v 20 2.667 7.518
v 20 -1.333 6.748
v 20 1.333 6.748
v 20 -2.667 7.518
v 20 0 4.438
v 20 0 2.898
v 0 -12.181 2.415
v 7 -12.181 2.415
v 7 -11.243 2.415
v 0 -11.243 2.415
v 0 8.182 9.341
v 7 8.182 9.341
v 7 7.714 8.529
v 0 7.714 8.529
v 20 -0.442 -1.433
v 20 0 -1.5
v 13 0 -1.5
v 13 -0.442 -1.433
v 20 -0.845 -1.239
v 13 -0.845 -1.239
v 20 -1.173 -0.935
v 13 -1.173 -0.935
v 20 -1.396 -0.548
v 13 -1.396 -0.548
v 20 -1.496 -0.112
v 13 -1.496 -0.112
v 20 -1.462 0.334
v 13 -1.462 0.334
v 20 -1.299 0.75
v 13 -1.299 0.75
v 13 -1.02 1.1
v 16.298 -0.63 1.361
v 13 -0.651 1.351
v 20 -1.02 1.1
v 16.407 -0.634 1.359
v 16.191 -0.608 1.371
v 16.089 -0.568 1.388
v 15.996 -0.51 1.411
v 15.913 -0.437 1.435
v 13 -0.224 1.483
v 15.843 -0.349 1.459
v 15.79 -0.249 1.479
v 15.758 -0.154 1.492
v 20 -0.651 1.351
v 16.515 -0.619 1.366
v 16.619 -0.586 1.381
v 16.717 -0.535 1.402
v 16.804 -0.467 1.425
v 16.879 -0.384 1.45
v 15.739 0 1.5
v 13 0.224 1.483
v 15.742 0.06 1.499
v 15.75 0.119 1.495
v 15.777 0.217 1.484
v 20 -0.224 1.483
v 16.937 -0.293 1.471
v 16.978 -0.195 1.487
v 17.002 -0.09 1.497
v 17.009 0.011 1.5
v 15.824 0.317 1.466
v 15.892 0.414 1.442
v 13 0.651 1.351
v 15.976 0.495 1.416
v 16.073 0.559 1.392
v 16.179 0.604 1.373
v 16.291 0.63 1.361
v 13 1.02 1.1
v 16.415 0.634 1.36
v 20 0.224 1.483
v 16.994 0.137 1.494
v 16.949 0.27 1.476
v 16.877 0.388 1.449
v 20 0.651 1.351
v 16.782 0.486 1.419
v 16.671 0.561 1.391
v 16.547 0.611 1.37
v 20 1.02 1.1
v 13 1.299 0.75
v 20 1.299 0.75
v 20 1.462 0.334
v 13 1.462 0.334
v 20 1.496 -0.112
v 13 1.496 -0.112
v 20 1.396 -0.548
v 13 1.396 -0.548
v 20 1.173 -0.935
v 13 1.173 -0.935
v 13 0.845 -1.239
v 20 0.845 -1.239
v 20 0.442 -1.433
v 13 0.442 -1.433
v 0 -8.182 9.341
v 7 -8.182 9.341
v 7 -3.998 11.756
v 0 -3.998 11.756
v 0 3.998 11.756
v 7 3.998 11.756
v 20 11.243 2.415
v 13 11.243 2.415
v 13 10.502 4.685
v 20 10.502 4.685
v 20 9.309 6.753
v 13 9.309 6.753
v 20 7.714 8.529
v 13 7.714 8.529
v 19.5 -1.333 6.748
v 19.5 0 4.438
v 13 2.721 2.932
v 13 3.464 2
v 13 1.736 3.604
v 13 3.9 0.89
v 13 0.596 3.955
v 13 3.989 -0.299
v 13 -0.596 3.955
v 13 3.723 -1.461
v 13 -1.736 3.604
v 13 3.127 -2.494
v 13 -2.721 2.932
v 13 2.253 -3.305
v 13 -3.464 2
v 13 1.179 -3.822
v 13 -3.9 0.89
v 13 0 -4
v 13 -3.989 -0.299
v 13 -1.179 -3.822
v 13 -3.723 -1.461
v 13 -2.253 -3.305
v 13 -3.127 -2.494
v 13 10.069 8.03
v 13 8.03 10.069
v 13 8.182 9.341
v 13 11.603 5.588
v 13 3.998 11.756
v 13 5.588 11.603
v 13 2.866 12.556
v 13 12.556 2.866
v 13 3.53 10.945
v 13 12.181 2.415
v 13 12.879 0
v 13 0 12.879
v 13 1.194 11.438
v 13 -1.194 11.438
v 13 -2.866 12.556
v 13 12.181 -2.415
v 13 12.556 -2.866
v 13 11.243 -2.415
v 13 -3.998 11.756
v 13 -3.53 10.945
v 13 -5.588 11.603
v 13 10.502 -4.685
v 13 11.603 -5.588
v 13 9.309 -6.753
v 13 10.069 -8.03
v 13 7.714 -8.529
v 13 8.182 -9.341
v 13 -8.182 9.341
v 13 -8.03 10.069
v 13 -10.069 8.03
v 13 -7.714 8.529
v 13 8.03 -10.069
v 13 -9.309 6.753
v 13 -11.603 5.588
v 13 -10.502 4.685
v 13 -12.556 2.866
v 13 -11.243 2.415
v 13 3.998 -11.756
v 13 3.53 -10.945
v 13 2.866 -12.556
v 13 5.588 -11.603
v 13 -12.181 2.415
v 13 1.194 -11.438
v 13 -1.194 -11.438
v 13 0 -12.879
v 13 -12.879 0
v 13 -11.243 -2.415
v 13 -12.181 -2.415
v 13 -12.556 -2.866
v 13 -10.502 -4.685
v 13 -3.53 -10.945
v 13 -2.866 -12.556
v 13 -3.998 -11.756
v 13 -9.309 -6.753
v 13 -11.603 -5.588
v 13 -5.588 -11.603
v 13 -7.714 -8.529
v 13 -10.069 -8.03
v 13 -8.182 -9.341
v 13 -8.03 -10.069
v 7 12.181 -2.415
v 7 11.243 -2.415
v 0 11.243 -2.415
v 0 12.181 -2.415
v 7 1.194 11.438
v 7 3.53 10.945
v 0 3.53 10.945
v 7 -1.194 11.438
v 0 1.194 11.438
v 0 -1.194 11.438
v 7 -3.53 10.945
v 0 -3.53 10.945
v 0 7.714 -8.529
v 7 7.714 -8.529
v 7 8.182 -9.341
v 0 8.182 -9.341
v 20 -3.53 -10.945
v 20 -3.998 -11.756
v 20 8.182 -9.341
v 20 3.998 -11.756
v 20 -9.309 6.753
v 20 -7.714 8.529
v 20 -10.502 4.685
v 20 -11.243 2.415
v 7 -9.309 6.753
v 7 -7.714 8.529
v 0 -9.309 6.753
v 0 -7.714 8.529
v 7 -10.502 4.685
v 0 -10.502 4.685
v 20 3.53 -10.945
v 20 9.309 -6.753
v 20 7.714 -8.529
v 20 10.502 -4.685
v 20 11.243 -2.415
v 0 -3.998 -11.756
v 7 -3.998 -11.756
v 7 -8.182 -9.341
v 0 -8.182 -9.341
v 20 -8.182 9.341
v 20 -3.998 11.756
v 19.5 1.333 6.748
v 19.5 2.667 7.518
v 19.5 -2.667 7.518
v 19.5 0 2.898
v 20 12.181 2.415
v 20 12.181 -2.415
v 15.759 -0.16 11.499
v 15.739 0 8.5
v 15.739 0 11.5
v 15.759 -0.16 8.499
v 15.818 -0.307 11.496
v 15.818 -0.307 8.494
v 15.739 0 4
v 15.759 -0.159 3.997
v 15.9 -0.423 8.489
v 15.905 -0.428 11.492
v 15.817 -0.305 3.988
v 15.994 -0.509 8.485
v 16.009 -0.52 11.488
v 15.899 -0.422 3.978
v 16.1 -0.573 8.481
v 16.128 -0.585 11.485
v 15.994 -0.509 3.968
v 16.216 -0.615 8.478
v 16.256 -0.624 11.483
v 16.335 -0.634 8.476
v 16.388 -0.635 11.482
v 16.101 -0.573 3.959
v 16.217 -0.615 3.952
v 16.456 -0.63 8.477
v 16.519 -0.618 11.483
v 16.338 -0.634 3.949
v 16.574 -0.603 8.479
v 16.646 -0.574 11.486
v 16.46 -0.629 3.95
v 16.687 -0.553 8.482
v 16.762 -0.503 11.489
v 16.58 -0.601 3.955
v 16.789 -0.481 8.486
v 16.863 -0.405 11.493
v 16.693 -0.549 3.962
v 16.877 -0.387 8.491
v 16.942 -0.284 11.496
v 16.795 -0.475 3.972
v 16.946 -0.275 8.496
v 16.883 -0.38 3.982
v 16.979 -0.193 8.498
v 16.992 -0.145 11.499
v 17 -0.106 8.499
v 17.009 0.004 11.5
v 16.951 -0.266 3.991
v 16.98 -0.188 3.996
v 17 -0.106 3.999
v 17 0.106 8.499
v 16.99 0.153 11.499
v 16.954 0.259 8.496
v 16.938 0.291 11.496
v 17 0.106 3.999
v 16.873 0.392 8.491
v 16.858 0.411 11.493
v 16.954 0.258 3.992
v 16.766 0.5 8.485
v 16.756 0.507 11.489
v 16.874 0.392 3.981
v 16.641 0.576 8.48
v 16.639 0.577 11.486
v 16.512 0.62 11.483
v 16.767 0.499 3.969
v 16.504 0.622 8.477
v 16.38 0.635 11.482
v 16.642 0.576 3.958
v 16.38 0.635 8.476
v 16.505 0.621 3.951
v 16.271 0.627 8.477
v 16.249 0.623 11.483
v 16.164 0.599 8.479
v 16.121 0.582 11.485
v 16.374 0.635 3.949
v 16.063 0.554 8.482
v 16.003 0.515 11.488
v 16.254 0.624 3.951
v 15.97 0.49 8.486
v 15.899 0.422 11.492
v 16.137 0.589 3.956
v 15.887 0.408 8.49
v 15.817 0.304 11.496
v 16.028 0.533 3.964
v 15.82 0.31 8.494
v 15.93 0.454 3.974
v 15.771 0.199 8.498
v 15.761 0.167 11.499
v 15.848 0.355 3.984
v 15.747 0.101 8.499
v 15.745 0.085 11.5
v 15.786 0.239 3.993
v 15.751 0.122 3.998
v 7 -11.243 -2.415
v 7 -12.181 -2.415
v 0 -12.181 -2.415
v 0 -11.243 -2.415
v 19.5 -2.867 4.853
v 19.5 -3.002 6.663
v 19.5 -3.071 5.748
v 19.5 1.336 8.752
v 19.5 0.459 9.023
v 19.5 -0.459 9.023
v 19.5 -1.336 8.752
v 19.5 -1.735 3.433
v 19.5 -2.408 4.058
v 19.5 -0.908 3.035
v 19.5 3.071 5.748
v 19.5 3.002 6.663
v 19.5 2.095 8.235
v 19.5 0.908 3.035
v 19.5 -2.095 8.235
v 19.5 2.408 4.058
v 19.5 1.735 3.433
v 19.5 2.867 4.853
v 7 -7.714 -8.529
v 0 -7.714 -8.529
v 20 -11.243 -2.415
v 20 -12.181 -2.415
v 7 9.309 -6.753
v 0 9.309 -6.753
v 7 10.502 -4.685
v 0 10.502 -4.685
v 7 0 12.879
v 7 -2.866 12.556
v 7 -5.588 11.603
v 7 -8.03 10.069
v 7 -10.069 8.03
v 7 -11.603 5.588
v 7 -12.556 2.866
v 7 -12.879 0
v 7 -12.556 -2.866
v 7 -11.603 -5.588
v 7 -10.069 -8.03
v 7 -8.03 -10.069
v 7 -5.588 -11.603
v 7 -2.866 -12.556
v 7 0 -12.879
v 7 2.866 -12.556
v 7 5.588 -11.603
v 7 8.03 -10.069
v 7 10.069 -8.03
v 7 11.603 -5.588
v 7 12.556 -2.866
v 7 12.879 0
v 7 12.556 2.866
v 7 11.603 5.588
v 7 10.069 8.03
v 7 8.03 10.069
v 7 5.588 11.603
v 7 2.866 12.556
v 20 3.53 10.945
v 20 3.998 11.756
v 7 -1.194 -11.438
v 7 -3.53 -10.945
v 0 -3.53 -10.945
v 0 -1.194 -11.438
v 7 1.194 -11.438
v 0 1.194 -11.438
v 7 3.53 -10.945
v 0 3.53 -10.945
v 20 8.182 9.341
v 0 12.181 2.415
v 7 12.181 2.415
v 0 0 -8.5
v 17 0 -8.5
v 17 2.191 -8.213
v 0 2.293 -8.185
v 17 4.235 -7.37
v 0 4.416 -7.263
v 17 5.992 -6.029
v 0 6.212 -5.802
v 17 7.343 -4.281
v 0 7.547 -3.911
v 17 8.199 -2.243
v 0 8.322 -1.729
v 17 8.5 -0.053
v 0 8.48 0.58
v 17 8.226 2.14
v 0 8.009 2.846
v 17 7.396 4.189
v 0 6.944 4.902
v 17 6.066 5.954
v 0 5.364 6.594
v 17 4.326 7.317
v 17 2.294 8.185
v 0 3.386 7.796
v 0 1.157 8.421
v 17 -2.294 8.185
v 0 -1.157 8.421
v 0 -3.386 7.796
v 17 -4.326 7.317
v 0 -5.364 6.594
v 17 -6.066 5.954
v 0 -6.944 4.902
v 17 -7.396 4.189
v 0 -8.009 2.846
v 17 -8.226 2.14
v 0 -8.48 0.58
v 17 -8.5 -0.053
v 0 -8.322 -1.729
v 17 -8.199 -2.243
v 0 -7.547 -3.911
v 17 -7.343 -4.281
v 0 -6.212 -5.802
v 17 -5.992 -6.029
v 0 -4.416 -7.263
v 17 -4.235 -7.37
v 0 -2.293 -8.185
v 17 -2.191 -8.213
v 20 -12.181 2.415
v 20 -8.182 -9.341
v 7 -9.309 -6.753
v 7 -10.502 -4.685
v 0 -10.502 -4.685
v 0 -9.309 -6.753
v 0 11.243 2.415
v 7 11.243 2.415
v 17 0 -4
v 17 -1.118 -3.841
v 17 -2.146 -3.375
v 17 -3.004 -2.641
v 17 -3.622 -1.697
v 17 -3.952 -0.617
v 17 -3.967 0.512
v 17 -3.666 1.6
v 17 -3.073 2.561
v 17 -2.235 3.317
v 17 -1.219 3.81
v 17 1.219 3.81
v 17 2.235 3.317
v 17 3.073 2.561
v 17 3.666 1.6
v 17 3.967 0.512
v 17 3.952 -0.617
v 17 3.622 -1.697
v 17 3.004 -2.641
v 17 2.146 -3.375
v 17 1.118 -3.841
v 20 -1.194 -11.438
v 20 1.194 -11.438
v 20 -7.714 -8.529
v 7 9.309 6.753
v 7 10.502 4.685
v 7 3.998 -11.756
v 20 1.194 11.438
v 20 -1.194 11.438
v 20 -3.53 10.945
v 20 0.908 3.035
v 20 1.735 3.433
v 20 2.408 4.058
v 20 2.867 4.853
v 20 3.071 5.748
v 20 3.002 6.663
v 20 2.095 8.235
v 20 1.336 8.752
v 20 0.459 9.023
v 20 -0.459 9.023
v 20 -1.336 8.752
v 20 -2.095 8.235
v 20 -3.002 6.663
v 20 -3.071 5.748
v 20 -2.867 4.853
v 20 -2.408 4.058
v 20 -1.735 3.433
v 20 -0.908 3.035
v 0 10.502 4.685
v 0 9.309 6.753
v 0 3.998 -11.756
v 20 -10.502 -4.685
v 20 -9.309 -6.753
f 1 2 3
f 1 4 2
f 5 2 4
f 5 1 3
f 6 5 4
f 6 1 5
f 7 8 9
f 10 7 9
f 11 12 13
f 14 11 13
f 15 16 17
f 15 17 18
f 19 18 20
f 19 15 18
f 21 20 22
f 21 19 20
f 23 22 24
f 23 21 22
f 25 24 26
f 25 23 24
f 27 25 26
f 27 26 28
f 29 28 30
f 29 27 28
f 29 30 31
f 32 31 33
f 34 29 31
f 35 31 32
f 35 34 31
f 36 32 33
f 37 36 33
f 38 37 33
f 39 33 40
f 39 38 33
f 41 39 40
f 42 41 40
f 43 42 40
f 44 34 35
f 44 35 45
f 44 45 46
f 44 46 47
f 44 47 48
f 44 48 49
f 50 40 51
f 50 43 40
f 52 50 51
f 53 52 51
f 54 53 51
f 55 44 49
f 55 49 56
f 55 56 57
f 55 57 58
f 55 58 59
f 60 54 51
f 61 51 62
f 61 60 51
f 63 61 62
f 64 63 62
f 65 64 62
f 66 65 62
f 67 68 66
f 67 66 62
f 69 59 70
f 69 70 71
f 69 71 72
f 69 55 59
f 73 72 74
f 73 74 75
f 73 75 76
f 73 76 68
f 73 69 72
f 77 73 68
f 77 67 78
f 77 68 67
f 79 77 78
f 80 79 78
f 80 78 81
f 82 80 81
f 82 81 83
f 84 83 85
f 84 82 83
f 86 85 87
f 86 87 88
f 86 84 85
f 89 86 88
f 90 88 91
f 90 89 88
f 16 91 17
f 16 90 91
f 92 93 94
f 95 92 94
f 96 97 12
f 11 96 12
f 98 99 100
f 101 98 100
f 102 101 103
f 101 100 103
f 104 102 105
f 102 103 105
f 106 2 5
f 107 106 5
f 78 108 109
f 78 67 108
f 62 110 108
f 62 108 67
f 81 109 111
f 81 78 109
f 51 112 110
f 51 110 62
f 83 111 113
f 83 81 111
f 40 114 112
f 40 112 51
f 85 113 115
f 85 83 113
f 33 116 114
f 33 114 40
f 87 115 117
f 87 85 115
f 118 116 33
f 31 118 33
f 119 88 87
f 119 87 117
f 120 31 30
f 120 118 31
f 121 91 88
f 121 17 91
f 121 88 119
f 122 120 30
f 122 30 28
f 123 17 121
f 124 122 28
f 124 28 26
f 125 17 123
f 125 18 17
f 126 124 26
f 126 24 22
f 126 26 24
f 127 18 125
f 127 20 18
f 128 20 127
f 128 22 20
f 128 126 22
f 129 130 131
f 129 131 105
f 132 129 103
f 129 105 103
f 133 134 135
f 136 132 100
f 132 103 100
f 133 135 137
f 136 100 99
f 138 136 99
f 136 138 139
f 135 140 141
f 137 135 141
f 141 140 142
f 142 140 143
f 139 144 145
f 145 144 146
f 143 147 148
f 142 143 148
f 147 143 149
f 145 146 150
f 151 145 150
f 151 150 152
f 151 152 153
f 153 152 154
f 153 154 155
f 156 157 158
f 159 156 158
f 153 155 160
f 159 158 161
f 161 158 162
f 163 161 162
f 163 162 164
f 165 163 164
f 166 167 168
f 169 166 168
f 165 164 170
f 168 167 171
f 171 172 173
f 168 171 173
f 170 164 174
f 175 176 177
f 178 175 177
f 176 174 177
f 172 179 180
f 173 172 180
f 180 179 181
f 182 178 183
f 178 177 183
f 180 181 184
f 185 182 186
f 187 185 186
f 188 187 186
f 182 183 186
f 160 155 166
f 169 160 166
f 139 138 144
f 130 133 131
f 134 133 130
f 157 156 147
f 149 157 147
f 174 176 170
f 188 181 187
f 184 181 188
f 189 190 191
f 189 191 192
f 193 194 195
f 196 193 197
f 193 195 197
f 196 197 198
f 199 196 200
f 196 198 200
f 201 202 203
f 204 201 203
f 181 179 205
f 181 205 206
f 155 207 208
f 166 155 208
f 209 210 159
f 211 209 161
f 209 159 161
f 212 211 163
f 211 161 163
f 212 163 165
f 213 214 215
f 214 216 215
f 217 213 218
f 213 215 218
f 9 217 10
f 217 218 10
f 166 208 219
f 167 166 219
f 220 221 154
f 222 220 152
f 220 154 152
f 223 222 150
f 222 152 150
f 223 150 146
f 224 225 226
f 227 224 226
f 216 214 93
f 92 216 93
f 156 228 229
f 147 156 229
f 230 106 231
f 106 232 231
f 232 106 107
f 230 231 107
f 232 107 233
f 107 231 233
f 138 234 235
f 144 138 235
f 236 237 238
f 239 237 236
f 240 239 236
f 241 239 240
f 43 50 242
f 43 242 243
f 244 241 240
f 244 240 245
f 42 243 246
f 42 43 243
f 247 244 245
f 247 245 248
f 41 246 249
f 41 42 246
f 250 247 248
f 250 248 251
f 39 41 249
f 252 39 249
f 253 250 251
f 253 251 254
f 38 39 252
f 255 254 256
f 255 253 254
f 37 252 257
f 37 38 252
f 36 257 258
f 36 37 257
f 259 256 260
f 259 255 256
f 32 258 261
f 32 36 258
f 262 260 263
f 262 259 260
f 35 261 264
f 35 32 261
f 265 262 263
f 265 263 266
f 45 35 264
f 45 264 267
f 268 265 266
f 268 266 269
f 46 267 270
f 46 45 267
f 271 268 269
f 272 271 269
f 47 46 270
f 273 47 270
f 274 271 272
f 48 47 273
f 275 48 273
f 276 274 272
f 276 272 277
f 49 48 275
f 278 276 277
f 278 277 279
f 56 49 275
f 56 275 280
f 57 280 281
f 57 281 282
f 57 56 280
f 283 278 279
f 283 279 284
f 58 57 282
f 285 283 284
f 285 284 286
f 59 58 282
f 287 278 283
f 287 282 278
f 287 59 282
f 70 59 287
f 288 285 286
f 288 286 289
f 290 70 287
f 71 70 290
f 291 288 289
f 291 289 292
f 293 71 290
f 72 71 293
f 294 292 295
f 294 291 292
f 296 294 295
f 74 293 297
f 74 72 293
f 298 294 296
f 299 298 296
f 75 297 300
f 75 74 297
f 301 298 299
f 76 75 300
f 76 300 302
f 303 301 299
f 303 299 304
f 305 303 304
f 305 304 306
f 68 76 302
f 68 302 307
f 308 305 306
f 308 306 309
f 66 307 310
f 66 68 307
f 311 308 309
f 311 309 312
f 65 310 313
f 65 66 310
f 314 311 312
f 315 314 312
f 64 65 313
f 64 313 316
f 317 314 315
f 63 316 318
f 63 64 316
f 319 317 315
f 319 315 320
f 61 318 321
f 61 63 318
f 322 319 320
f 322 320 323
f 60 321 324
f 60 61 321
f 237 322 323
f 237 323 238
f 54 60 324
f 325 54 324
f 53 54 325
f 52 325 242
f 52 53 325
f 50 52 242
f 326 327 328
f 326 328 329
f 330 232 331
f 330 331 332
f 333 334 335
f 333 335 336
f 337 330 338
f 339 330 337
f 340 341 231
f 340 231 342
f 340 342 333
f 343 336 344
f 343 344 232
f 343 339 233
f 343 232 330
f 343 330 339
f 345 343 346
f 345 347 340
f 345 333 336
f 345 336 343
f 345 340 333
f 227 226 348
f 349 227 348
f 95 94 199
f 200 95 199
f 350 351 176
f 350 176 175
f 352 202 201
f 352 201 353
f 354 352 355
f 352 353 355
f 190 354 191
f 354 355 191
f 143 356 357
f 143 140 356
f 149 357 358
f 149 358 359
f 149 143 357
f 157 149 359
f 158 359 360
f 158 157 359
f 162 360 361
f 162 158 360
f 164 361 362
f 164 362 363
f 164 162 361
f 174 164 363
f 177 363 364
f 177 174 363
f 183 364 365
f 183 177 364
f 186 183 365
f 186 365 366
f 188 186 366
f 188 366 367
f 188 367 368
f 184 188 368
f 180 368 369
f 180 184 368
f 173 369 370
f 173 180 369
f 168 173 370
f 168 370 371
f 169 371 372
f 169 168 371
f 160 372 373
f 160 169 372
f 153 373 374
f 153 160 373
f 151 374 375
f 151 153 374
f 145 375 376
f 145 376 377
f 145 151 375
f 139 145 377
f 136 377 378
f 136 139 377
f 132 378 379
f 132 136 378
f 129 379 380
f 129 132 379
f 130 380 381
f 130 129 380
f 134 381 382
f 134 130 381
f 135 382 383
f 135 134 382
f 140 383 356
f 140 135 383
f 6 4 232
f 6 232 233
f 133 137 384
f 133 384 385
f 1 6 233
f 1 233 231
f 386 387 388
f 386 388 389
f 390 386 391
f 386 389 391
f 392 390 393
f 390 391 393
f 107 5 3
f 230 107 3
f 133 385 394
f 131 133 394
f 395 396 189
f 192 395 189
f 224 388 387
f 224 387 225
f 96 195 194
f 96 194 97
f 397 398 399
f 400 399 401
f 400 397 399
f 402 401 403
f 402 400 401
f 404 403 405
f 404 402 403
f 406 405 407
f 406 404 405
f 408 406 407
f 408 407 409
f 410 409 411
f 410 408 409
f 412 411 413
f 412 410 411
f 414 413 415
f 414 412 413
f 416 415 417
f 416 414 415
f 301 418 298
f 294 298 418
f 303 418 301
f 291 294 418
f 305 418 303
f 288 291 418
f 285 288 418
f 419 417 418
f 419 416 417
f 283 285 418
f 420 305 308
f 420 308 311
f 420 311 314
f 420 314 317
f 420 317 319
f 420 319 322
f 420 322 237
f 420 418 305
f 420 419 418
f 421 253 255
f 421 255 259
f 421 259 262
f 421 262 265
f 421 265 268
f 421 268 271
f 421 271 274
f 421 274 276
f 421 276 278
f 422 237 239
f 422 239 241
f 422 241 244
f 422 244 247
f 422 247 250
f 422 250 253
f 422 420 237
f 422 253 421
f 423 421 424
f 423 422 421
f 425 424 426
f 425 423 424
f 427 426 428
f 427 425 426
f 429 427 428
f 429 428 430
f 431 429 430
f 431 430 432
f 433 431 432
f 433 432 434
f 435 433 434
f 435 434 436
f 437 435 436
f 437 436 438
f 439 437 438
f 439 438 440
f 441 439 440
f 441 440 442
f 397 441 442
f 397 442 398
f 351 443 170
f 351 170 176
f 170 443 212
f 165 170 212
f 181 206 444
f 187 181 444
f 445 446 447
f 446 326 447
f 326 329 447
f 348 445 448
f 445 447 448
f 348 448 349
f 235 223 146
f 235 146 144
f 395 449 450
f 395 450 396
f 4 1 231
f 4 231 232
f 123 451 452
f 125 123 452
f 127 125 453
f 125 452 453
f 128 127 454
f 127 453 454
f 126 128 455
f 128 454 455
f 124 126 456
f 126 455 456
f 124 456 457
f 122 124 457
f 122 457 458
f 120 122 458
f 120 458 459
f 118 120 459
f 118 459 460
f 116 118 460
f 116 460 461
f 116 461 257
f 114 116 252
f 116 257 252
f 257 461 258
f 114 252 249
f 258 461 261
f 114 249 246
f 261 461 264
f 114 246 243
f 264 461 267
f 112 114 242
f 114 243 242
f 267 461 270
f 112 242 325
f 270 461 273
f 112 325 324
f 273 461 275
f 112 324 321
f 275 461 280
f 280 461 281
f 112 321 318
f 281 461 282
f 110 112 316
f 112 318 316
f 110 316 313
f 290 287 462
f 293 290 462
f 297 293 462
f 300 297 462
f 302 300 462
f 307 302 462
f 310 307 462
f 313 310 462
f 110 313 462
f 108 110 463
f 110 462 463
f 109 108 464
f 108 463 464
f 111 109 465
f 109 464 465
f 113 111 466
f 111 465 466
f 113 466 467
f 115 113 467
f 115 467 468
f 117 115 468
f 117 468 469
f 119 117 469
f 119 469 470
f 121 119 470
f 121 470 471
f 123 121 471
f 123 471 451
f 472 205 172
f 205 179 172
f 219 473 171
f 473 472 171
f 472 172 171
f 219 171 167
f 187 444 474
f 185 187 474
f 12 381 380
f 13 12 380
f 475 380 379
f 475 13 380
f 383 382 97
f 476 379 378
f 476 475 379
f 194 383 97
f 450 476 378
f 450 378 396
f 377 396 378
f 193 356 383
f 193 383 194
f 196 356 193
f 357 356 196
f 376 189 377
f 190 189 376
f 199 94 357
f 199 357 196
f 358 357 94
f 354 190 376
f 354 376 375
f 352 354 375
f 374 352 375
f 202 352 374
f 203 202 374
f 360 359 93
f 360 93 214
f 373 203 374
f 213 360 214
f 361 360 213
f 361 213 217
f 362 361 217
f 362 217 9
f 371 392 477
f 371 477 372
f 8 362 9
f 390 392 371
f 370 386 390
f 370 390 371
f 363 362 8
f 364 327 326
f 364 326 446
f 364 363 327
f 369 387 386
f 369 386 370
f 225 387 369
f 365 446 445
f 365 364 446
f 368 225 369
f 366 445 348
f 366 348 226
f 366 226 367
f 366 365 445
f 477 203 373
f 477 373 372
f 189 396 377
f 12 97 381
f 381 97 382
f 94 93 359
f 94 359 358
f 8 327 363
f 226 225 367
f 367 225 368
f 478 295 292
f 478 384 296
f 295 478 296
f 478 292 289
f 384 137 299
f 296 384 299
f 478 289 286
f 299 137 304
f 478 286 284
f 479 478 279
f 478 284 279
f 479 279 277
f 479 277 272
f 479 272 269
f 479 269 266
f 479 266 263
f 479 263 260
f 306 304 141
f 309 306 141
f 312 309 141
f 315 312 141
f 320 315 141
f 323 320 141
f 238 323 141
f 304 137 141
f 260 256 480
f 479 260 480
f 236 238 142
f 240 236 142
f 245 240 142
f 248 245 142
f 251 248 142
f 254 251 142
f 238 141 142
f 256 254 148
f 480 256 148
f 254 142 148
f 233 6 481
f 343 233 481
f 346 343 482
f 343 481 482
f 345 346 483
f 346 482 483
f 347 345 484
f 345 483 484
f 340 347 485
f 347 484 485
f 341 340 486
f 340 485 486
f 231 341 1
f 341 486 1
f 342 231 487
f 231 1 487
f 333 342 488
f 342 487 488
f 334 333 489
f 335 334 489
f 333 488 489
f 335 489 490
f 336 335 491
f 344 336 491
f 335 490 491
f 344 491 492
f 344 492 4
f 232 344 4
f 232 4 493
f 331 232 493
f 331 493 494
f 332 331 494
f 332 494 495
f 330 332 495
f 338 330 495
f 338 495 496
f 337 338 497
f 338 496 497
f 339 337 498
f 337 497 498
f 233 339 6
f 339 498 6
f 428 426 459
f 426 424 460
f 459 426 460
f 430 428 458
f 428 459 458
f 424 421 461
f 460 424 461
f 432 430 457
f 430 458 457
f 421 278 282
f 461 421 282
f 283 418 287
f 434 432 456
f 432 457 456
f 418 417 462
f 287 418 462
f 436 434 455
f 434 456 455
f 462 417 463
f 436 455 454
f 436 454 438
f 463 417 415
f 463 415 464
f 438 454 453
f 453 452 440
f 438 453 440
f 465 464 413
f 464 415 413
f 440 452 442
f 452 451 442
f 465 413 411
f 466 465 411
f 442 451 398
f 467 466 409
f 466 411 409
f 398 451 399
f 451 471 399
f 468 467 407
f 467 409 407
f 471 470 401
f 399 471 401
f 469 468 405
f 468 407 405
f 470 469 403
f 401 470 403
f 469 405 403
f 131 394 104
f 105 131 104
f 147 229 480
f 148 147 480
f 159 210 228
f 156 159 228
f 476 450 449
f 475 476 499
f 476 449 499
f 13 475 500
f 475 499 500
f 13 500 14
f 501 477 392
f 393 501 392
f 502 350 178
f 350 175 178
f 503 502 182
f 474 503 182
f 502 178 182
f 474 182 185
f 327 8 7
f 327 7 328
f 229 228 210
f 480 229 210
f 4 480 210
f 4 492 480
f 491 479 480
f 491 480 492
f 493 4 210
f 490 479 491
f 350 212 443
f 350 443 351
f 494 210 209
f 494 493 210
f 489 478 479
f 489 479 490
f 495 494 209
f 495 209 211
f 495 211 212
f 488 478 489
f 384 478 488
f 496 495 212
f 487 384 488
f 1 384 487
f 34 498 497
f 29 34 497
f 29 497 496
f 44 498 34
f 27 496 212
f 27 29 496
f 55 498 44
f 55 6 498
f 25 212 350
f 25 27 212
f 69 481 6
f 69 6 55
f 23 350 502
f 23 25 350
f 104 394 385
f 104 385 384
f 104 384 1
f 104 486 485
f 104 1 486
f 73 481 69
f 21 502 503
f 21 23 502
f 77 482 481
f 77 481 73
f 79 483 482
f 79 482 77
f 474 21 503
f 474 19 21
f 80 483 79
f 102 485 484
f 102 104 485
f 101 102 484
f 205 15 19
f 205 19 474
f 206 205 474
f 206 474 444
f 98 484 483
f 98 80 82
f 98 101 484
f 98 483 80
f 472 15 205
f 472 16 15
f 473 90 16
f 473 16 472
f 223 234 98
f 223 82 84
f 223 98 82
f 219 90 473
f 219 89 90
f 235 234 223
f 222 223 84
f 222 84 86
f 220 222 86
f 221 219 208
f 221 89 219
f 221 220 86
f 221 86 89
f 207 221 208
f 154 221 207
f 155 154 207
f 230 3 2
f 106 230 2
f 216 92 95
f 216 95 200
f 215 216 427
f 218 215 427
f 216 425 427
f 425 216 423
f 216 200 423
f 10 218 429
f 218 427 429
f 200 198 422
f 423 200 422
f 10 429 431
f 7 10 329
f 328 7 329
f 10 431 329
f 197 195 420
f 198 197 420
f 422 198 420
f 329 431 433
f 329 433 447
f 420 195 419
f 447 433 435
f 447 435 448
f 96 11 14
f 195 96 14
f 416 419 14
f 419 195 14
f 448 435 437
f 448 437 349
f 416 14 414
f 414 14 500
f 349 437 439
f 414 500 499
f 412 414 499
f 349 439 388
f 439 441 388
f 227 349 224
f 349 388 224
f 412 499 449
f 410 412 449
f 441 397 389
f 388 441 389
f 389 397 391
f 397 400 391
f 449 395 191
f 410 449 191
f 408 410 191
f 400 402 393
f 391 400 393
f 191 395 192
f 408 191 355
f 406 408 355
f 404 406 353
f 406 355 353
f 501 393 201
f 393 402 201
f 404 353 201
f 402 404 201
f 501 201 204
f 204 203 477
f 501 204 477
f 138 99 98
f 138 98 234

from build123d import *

# Parameters (mm, degrees)
CROQUIS1_R              = 11.5
SALIENTE_EXTRUIR1_DEPTH = 20
VACIADO2_T              = -3
CROQUIS2_R              = 1.5
CORTAR_EXTRUIR1_DEPTH   = 20
CROQUIS3_W              = 4.830825058
CROQUIS3_H              = 1.361160648
SALIENTE_EXTRUIR2_DEPTH = 20
CROQUIS4_W              = 6
CROQUIS4_H              = 1.635071494
CROQUIS5_R              = 4
CROQUIS5_R_2            = 1.5
SALIENTE_EXTRUIR3_DEPTH = 4
CROQUIS6_R              = 3.079540119
CORTAR_EXTRUIR3_DEPTH   = 0.5
SALIENTE_EXTRUIR4_DEPTH = 0.5
CROQUIS9_R              = 0.635
CORTAR_EXTRUIR4_DEPTH   = 20


with BuildPart() as part:
    # Croquis1 → Saliente-Extruir1 (new body)
    with BuildSketch(Plane(origin=(0, 0, 0), x_dir=(0, 0, -1), z_dir=(1, 0, 0))):
        Circle(CROQUIS1_R)
    extrude(amount=SALIENTE_EXTRUIR1_DEPTH)

    # Vaciado2
    vaciado2_openings = [part.faces().sort_by_distance(p)[0] for p in [
        (0, 0, 0),
    ]]
    offset(amount=VACIADO2_T, openings=vaciado2_openings, kind=Kind.INTERSECTION)

    # Croquis2 → Cortar-Extruir1 (cut)
    with BuildSketch(Plane(origin=(20, 0, 0), x_dir=(0, 0, -1), z_dir=(1, 0, 0))):
        Circle(CROQUIS2_R)
    extrude(amount=-CORTAR_EXTRUIR1_DEPTH, mode=Mode.SUBTRACT)

    # Croquis3 → Saliente-Extruir2 (add, through all)
    with BuildSketch(Plane(origin=(20, 0, 0), x_dir=(0, 0, -1), z_dir=(1, 0, 0))):
        with Locations((0, 11.5)):
            Rectangle(CROQUIS3_W, CROQUIS3_H)
        Polygon((8.162186029, 7.501518448), (9.340985729, 8.182098773), (11.756398258, 3.998481552), (10.577598558, 3.317901227), align=None)
        Polygon((10.577598558, -3.317901227), (11.756398258, -3.998481552), (9.340985729, -8.182098773), (8.162186029, -7.501518448), align=None)
        with Locations((0, -11.5)):
            Rectangle(CROQUIS3_W, CROQUIS3_H)
        Polygon((-8.162186029, -7.501518448), (-9.340985729, -8.182098773), (-11.756398258, -3.998481552), (-10.577598558, -3.317901227), align=None)
        Polygon((-10.577598558, 3.317901227), (-11.756398258, 3.998481552), (-9.340985729, 8.182098773), (-8.162186029, 7.501518448), align=None)
    extrude(amount=-SALIENTE_EXTRUIR2_DEPTH)

    # Croquis4 → Revolución1 (revolve)
    with BuildSketch(Plane.XY, mode=Mode.PRIVATE) as revoluci_n1_sk:
        with Locations((10, 12.06101307)):
            Rectangle(CROQUIS4_W, CROQUIS4_H)
    revolve(revoluci_n1_sk.sketch.rotate(Axis((-1.379569835, 0, 0), (1, 0, 0)), 90), axis=Axis((-1.379569835, 0, 0), (1, 0, 0)))

    # Croquis5 → Saliente-Extruir3 (add)
    with BuildSketch(Plane.ZY.offset(-17)):
        with Locations(Location((0, 0, 0), (0, 0, 180))):
            Circle(CROQUIS5_R)
        with Locations(Location((0, 0, 0), (0, 0, 180))):
            Circle(CROQUIS5_R_2, mode=Mode.SUBTRACT)
    extrude(amount=SALIENTE_EXTRUIR3_DEPTH)

    # Croquis6 → Cortar-Extruir3 (cut)
    with BuildSketch(Plane(origin=(20, 0, 0), x_dir=(0, 0, -1), z_dir=(1, 0, 0))):
        with Locations((-5.977795462, 0)):
            Circle(CROQUIS6_R)
    extrude(amount=-CORTAR_EXTRUIR3_DEPTH, mode=Mode.SUBTRACT)

    # Croquis9 → Cortar-Extruir4 (cut)
    with BuildSketch(Plane.XY):
        with Locations(Location((16.373914727, 0, 0), (0, 0, 180))):
            Circle(CROQUIS9_R)
    extrude(amount=CORTAR_EXTRUIR4_DEPTH, mode=Mode.SUBTRACT)


with BuildPart() as body_2:
    # Croquis8 → Saliente-Extruir4 (new body)
    with BuildSketch(Plane(origin=(20, 0, 0), x_dir=(0, 0, -1), z_dir=(1, 0, 0))):
        Polygon((-2.898255343, 0), (-7.517565521, 2.666959975), (-7.517565521, -2.666959975), align=None)
        Polygon((-4.438025402, 0), (-6.747680491, 1.333479987), (-6.747680491, -1.333479987), align=None, mode=Mode.SUBTRACT)
    extrude(amount=-SALIENTE_EXTRUIR4_DEPTH)


solid = Compound([part.part, body_2.part])
